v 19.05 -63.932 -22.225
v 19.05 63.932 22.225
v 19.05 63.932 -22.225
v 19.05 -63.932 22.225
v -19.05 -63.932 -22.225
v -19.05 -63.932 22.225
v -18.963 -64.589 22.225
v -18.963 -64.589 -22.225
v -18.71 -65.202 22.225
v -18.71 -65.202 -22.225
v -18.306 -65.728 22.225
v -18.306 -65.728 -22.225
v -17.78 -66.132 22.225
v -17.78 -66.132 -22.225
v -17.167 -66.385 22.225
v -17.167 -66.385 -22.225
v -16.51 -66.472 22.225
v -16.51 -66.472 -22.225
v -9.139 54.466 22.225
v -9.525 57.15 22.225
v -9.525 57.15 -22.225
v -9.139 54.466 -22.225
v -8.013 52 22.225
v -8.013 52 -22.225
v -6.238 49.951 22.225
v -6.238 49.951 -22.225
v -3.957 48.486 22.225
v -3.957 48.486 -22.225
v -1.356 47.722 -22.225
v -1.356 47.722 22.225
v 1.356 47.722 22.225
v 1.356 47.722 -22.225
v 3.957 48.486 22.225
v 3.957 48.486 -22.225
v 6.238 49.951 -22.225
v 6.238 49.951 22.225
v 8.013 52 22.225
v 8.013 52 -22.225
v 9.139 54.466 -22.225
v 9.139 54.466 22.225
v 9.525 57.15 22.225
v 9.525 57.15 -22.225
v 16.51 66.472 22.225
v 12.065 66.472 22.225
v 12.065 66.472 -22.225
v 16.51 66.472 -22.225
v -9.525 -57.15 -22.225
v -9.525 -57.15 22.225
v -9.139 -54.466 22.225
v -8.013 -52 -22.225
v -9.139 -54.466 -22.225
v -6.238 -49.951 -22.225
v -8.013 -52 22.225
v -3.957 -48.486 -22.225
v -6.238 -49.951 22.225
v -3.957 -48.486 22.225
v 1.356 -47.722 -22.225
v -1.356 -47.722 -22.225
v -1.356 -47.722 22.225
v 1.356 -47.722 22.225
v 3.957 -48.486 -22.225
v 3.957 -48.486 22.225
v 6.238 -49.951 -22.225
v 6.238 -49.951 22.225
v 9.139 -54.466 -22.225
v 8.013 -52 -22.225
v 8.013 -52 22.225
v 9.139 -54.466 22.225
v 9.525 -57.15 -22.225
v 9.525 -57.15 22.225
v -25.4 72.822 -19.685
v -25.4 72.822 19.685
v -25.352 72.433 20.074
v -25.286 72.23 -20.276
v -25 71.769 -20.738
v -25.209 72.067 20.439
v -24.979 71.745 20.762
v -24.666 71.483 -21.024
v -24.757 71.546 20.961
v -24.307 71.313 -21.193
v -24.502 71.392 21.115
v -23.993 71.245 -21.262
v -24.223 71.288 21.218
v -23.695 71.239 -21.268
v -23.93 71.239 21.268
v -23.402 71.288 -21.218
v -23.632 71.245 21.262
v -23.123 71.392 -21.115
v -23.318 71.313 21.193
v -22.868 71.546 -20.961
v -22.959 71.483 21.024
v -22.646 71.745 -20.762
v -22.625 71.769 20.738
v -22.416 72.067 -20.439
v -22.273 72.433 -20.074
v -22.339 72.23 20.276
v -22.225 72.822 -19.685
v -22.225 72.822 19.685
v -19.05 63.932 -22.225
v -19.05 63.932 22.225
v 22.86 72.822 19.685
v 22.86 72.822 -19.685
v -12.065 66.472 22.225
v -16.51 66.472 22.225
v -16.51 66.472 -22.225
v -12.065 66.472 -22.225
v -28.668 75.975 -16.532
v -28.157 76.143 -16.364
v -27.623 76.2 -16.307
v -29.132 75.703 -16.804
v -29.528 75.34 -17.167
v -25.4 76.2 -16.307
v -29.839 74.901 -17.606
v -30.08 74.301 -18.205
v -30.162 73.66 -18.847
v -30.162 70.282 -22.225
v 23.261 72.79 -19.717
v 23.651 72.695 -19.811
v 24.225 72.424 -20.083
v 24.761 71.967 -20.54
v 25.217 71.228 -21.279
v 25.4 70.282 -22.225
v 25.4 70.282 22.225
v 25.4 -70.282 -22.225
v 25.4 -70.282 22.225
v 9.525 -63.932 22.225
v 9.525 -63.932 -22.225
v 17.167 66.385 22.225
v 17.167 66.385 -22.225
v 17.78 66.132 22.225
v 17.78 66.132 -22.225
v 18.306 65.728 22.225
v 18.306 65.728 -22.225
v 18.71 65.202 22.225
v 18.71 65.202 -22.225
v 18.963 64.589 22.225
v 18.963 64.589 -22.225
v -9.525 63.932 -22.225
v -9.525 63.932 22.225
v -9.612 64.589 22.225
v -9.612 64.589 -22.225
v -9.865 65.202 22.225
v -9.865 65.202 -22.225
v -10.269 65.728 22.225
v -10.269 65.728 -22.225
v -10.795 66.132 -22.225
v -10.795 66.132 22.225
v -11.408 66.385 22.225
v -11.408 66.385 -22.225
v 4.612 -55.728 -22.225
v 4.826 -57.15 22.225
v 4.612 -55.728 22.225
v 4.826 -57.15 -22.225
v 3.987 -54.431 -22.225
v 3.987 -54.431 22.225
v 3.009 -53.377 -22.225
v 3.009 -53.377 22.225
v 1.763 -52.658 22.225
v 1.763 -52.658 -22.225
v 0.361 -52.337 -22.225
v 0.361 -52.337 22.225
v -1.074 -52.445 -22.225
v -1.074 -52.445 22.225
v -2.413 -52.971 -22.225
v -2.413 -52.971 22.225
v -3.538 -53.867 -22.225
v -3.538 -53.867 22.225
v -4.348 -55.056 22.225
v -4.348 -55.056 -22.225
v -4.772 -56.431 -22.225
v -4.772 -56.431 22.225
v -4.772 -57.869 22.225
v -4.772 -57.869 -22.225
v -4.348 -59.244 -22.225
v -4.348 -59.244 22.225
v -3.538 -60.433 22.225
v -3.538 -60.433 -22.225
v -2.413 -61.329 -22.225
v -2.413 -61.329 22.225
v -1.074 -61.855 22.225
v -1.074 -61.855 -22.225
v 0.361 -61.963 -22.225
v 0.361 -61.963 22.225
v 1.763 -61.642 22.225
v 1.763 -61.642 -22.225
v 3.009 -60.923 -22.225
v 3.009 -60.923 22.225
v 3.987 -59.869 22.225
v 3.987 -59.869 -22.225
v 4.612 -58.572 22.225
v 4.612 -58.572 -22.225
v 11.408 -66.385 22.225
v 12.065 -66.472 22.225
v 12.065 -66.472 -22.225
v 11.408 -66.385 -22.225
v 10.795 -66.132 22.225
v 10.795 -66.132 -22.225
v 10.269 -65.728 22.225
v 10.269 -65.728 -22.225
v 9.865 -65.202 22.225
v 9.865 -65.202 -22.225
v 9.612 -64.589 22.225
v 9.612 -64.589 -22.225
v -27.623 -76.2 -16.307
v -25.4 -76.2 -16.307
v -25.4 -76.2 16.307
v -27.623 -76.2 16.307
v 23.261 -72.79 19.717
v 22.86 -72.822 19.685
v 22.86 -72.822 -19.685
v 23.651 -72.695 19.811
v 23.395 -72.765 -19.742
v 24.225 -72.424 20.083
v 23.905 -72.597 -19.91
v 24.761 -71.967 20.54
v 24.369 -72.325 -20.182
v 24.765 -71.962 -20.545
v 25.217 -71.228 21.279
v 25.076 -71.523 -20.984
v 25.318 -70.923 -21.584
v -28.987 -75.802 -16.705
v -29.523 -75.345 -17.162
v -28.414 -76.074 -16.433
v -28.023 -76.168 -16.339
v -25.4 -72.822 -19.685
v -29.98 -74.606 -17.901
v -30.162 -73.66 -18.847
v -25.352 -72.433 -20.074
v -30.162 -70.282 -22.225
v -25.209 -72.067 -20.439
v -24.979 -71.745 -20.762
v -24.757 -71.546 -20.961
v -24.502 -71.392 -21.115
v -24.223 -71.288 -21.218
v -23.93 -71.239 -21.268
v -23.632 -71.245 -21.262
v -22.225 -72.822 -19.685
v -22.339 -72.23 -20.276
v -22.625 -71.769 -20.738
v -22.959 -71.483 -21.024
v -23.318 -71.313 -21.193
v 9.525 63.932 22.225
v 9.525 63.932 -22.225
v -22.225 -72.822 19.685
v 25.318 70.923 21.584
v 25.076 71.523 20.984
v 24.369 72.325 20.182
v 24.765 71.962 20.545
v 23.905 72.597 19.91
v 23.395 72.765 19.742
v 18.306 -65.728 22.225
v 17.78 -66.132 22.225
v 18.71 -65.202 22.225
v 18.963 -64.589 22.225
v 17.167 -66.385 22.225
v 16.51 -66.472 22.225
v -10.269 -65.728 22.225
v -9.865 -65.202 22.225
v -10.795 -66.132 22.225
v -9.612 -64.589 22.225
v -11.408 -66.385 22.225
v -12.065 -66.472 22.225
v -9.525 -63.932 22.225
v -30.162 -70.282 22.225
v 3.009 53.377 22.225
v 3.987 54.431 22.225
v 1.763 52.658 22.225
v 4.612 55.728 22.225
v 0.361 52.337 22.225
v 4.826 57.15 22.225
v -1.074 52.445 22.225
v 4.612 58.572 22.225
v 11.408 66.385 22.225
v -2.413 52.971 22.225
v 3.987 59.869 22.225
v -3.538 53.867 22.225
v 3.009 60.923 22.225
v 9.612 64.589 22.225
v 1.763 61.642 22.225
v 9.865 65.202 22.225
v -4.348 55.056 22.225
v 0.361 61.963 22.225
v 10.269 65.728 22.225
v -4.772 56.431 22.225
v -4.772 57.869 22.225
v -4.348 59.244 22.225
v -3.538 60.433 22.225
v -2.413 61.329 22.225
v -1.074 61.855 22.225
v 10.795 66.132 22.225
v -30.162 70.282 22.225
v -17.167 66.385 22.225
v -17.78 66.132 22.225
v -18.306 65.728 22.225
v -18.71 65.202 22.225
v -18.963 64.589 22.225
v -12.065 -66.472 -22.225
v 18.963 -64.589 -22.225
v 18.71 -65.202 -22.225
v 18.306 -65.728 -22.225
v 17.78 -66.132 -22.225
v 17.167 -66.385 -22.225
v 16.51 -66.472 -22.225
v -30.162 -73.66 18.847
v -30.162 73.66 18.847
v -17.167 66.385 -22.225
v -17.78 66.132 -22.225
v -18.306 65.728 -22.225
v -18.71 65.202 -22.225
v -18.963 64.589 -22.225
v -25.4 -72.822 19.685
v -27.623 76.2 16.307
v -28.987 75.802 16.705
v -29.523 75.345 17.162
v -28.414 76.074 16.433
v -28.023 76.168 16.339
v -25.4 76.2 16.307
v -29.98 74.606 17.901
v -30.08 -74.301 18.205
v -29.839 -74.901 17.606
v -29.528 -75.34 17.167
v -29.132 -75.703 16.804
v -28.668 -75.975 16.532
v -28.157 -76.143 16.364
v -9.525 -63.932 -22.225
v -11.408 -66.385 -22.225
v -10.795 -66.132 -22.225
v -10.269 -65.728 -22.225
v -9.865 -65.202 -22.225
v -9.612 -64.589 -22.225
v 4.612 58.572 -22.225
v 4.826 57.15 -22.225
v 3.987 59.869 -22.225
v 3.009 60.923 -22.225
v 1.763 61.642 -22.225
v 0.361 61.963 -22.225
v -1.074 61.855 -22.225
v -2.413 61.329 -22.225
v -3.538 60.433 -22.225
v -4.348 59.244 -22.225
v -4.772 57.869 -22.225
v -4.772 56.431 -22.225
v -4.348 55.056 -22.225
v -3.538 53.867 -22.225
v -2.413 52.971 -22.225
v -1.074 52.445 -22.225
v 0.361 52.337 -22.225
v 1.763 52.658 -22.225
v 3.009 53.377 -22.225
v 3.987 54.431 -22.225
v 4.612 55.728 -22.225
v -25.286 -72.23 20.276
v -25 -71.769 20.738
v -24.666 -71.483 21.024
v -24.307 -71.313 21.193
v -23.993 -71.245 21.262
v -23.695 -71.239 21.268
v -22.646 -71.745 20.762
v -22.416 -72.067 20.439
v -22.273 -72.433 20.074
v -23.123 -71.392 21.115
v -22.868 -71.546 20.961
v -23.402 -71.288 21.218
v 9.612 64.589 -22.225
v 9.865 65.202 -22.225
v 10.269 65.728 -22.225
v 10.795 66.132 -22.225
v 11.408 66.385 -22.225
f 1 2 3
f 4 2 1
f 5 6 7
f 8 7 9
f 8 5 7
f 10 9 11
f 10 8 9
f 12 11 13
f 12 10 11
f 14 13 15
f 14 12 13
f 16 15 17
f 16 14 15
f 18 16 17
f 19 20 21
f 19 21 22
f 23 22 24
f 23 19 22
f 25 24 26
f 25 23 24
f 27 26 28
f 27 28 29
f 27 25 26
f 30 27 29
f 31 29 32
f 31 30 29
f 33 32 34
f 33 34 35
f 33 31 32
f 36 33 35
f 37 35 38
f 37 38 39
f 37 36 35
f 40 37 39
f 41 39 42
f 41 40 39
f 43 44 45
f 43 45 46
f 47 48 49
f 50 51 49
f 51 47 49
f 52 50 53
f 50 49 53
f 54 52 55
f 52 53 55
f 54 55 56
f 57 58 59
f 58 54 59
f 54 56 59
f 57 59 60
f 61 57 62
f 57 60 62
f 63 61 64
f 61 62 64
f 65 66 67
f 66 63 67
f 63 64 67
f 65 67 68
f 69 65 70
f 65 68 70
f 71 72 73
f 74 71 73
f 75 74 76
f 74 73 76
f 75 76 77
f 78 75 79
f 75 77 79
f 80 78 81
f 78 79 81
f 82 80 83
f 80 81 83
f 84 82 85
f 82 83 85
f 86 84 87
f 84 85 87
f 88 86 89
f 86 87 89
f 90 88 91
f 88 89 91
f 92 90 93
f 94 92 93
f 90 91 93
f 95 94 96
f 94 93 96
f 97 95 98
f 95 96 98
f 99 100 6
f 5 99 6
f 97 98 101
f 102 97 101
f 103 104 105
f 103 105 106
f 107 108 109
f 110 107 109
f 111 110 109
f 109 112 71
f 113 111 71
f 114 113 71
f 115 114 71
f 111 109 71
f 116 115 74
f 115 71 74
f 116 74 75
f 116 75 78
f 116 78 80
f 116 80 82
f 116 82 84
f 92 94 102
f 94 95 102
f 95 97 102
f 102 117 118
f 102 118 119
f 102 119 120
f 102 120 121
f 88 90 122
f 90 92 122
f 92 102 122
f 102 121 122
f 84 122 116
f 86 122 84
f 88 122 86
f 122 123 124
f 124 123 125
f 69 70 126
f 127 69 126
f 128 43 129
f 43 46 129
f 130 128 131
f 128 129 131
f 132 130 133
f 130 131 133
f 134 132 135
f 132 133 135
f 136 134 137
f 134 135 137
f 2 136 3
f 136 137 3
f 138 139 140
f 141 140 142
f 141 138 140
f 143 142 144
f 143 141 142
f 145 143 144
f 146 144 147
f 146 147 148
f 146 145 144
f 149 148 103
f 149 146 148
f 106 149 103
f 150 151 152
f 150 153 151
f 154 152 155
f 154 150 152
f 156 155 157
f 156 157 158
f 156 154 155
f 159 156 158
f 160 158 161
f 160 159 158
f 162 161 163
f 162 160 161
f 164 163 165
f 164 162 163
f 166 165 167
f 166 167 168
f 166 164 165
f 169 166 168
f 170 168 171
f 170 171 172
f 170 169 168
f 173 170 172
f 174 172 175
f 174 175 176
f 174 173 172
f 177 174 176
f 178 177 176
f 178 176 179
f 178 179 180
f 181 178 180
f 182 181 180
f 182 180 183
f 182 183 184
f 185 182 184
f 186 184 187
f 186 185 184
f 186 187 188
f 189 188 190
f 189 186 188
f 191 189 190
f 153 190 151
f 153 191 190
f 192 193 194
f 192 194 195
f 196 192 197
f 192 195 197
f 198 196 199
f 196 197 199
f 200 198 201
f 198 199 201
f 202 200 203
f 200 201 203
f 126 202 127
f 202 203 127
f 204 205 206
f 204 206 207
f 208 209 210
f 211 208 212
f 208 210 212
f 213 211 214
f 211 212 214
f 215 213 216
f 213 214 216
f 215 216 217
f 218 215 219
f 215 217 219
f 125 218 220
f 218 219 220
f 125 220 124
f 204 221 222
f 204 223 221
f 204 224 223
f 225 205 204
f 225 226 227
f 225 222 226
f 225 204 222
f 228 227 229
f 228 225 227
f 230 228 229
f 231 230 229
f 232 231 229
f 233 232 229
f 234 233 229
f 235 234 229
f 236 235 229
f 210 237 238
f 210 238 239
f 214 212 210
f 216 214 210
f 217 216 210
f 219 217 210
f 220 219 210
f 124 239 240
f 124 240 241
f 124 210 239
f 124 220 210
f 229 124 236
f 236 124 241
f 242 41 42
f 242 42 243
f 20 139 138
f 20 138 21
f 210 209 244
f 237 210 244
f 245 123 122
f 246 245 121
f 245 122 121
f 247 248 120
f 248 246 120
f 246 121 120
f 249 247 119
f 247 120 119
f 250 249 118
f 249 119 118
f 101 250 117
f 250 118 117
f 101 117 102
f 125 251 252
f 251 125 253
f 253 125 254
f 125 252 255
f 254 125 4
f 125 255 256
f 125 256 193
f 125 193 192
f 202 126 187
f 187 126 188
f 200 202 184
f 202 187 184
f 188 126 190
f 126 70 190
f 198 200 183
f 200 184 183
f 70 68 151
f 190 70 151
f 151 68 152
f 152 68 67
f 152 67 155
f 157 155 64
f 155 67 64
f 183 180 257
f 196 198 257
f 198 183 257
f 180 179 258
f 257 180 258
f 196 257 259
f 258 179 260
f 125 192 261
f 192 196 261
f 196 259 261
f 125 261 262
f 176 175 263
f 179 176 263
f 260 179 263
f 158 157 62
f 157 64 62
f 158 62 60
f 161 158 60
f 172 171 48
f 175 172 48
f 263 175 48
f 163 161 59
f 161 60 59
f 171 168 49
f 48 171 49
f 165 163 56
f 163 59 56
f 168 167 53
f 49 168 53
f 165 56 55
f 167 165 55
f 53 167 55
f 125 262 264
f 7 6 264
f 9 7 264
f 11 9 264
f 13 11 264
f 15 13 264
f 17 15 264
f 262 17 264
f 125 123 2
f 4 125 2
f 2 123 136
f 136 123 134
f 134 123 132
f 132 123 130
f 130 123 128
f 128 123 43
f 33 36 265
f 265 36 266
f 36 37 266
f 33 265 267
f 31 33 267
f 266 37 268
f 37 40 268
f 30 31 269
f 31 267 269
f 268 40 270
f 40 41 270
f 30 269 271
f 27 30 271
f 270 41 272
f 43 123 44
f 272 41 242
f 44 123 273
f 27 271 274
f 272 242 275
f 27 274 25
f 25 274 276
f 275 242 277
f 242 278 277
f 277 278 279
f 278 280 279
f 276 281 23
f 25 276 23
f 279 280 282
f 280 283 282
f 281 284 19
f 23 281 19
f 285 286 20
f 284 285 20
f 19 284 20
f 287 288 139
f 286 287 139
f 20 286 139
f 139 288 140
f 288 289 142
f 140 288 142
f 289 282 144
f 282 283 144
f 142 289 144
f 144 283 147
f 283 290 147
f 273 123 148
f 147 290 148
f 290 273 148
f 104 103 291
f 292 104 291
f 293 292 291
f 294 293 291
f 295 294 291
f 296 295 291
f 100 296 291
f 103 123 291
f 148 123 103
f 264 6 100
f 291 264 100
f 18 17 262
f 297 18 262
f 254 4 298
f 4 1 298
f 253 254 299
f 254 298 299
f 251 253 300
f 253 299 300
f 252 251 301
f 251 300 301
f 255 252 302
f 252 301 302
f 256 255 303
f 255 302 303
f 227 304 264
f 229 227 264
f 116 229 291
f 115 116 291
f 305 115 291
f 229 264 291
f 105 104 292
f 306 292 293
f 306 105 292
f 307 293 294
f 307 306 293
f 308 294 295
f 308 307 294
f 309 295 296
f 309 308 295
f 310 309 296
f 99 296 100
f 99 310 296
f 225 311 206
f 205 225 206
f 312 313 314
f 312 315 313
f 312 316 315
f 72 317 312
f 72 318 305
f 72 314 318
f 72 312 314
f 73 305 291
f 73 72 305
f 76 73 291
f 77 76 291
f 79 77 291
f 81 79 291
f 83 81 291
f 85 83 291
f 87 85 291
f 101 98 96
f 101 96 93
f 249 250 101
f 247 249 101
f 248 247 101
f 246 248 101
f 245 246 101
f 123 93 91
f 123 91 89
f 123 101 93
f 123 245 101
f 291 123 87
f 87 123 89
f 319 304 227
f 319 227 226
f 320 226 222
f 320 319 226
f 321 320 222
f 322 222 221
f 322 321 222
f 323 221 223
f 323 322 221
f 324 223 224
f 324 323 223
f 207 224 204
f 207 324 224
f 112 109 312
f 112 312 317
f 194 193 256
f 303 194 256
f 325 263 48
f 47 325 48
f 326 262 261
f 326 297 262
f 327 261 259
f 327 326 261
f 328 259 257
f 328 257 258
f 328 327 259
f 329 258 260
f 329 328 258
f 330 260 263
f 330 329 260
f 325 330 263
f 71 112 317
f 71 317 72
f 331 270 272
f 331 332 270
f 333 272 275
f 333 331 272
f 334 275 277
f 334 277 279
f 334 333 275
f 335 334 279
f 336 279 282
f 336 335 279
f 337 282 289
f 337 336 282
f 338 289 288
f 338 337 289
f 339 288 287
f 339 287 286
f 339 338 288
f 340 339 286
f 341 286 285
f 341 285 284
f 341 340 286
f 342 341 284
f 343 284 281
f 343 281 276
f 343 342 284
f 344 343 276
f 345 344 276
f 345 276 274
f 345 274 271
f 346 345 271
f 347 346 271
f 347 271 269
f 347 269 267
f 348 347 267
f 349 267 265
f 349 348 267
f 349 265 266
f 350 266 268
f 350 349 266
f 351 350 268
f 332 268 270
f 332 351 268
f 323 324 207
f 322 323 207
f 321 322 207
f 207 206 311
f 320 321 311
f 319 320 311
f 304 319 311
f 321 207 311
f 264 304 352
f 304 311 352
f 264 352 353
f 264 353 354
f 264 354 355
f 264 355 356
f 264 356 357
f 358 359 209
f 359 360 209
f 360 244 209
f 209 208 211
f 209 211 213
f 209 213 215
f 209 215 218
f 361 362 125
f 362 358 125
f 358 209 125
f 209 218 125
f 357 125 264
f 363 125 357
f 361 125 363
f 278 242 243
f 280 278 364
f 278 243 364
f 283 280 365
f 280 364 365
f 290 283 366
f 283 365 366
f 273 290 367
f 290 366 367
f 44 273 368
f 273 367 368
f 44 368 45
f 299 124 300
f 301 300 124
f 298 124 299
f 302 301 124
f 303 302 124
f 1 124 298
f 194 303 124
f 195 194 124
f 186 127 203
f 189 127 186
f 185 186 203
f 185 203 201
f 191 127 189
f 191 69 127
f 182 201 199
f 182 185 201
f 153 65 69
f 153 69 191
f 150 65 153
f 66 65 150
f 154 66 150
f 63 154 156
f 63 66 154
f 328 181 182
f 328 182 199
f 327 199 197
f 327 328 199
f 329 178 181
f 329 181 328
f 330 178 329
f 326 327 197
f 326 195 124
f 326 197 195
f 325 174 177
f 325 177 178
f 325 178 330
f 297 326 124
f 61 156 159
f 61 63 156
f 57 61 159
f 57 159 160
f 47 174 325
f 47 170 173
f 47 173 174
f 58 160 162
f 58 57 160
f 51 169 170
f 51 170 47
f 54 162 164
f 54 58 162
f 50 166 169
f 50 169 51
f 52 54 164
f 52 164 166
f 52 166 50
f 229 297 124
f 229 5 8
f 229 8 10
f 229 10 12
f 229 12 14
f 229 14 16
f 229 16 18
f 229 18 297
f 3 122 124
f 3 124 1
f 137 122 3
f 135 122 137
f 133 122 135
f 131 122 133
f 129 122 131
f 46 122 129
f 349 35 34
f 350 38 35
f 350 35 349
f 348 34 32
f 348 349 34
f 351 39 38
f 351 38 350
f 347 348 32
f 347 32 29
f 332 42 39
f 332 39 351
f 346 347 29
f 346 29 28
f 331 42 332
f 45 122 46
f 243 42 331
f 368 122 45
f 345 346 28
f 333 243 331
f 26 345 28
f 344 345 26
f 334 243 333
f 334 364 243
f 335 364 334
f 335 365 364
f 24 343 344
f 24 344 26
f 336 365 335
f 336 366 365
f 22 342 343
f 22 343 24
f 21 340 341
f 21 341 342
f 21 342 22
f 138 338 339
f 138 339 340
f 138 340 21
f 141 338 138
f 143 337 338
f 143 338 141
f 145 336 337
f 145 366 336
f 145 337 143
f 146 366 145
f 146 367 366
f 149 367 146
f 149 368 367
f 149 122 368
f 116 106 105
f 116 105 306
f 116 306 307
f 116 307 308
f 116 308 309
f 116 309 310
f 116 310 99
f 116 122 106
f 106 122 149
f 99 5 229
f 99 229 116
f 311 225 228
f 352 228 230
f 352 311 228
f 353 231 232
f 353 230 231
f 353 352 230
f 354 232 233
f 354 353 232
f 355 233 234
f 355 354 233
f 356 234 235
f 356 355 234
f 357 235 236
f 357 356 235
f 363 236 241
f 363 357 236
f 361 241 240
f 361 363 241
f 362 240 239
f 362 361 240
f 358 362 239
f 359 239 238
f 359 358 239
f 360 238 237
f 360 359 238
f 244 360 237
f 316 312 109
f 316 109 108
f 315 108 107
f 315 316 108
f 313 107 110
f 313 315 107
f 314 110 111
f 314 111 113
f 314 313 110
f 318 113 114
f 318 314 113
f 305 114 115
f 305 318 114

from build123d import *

# Parameters (mm, degrees)
SKETCH1_R            = 4.826
BOSS_EXTRUDE1_DEPTH  = 22.225
CUT_EXTRUDE2_DEPTH   = 45.45
CUT_EXTRUDE3_DEPTH   = 45.45
FILLET1_R            = 2.54
CUT_EXTRUDE4_DEPTH   = 56.5625
MIRROR3_COPY_1_DEPTH = 56.5625


with BuildPart() as part:
    # Sketch1 → Boss-Extrude1 (new body, symmetric)
    with BuildSketch(Plane.XY):
        Polygon((-25.4, 72.8218), (25.4, 72.8218), (25.4, -72.8218), (-25.4, -72.8218), (-25.4, -76.2), (-30.1625, -76.2), (-30.1625, 76.2), (-25.4, 76.2), align=None)
        with Locations((0, 57.15)):
            Circle(SKETCH1_R, mode=Mode.SUBTRACT)
        with Locations((0, -57.15)):
            Circle(SKETCH1_R, mode=Mode.SUBTRACT)
    extrude(amount=BOSS_EXTRUDE1_DEPTH, both=True)

    # Sketch3 → Cut-Extrude2 (cut, through all)
    with BuildSketch(Plane.XY.offset(22.225)):
        with BuildLine():
            Line((-19.05, 66.4718), (-9.525, 66.4718))
            Line((-9.525, 66.4718), (-9.525, 57.15))
            ThreePointArc((-9.525, 57.15), (0, 47.625), (9.525, 57.15))
            Line((9.525, 57.15), (9.525, 66.4718))
            Line((9.525, 66.4718), (19.05, 66.4718))
            Line((19.05, 66.4718), (19.05, 0))
            Line((19.05, 0), (-19.05, 0))
            Line((-19.05, 0), (-19.05, 66.4718))
        make_face()
    cut_extrude2 = extrude(amount=-CUT_EXTRUDE2_DEPTH, mode=Mode.SUBTRACT)

    # Sketch4 → Cut-Extrude3 (cut, through all)
    with BuildSketch(Plane.XY.offset(22.225)):
        with BuildLine():
            Line((-22.225, 72.8218), (-25.4, 72.8218))
            ThreePointArc((-25.4, 72.8218), (-23.8125, 71.2343), (-22.225, 72.8218))
        make_face()
    cut_extrude3 = extrude(amount=-CUT_EXTRUDE3_DEPTH, mode=Mode.SUBTRACT)

    # Mirror1: Cut-Extrude2, Cut-Extrude3 across plane
    add(cut_extrude2.mirror(Plane.ZX), mode=Mode.SUBTRACT)
    add(cut_extrude3.mirror(Plane.ZX), mode=Mode.SUBTRACT)

    # Fillet1
    fillet1_edges = [part.edges().sort_by_distance(p)[0] for p in [
        (25.4, 72.8218, 0),
        (25.4, -72.8218, 0),
        (-30.1625, -76.2, 0),
        (-30.1625, 76.2, 0),
        (-19.05, 66.4718, 0),
        (-9.525, 66.4718, 0),
        (9.525, 66.4718, 0),
        (19.05, 66.4718, 0),
        (-19.05, -66.4718, 0),
        (19.05, -66.4718, 0),
        (9.525, -66.4718, 0),
        (-9.525, -66.4718, 0),
    ]]
    fillet(fillet1_edges, radius=FILLET1_R)

    # Sketch5 → Cut-Extrude4 (cut, through all)
    with BuildSketch(Plane(origin=(25.4, 0, 0), x_dir=(0, 0, -1), z_dir=(1, 0, 0))):
        Polygon((16.3068, 76.2), (22.225, 70.2818), (22.225, 76.2), align=None)
    cut_extrude4 = extrude(amount=-CUT_EXTRUDE4_DEPTH, mode=Mode.SUBTRACT)

    # Mirror2: Cut-Extrude4 across plane
    add(cut_extrude4.mirror(Plane.XY), mode=Mode.SUBTRACT)

    # Mirror3: Cut-Extrude4 across plane
    add(cut_extrude4.mirror(Plane.ZX), mode=Mode.SUBTRACT)

    # Mirror3 copy 1 sketch → Mirror3 copy 1 (cut, through all)
    with BuildSketch(Plane(origin=(25.4, 0, 0), x_dir=(0, 0, 1), z_dir=(1, 0, 0))):
        Polygon((16.3068, 76.2), (22.225, 70.2818), (22.225, 76.2), align=None)
    extrude(amount=-MIRROR3_COPY_1_DEPTH, mode=Mode.SUBTRACT)


solid = part.part
